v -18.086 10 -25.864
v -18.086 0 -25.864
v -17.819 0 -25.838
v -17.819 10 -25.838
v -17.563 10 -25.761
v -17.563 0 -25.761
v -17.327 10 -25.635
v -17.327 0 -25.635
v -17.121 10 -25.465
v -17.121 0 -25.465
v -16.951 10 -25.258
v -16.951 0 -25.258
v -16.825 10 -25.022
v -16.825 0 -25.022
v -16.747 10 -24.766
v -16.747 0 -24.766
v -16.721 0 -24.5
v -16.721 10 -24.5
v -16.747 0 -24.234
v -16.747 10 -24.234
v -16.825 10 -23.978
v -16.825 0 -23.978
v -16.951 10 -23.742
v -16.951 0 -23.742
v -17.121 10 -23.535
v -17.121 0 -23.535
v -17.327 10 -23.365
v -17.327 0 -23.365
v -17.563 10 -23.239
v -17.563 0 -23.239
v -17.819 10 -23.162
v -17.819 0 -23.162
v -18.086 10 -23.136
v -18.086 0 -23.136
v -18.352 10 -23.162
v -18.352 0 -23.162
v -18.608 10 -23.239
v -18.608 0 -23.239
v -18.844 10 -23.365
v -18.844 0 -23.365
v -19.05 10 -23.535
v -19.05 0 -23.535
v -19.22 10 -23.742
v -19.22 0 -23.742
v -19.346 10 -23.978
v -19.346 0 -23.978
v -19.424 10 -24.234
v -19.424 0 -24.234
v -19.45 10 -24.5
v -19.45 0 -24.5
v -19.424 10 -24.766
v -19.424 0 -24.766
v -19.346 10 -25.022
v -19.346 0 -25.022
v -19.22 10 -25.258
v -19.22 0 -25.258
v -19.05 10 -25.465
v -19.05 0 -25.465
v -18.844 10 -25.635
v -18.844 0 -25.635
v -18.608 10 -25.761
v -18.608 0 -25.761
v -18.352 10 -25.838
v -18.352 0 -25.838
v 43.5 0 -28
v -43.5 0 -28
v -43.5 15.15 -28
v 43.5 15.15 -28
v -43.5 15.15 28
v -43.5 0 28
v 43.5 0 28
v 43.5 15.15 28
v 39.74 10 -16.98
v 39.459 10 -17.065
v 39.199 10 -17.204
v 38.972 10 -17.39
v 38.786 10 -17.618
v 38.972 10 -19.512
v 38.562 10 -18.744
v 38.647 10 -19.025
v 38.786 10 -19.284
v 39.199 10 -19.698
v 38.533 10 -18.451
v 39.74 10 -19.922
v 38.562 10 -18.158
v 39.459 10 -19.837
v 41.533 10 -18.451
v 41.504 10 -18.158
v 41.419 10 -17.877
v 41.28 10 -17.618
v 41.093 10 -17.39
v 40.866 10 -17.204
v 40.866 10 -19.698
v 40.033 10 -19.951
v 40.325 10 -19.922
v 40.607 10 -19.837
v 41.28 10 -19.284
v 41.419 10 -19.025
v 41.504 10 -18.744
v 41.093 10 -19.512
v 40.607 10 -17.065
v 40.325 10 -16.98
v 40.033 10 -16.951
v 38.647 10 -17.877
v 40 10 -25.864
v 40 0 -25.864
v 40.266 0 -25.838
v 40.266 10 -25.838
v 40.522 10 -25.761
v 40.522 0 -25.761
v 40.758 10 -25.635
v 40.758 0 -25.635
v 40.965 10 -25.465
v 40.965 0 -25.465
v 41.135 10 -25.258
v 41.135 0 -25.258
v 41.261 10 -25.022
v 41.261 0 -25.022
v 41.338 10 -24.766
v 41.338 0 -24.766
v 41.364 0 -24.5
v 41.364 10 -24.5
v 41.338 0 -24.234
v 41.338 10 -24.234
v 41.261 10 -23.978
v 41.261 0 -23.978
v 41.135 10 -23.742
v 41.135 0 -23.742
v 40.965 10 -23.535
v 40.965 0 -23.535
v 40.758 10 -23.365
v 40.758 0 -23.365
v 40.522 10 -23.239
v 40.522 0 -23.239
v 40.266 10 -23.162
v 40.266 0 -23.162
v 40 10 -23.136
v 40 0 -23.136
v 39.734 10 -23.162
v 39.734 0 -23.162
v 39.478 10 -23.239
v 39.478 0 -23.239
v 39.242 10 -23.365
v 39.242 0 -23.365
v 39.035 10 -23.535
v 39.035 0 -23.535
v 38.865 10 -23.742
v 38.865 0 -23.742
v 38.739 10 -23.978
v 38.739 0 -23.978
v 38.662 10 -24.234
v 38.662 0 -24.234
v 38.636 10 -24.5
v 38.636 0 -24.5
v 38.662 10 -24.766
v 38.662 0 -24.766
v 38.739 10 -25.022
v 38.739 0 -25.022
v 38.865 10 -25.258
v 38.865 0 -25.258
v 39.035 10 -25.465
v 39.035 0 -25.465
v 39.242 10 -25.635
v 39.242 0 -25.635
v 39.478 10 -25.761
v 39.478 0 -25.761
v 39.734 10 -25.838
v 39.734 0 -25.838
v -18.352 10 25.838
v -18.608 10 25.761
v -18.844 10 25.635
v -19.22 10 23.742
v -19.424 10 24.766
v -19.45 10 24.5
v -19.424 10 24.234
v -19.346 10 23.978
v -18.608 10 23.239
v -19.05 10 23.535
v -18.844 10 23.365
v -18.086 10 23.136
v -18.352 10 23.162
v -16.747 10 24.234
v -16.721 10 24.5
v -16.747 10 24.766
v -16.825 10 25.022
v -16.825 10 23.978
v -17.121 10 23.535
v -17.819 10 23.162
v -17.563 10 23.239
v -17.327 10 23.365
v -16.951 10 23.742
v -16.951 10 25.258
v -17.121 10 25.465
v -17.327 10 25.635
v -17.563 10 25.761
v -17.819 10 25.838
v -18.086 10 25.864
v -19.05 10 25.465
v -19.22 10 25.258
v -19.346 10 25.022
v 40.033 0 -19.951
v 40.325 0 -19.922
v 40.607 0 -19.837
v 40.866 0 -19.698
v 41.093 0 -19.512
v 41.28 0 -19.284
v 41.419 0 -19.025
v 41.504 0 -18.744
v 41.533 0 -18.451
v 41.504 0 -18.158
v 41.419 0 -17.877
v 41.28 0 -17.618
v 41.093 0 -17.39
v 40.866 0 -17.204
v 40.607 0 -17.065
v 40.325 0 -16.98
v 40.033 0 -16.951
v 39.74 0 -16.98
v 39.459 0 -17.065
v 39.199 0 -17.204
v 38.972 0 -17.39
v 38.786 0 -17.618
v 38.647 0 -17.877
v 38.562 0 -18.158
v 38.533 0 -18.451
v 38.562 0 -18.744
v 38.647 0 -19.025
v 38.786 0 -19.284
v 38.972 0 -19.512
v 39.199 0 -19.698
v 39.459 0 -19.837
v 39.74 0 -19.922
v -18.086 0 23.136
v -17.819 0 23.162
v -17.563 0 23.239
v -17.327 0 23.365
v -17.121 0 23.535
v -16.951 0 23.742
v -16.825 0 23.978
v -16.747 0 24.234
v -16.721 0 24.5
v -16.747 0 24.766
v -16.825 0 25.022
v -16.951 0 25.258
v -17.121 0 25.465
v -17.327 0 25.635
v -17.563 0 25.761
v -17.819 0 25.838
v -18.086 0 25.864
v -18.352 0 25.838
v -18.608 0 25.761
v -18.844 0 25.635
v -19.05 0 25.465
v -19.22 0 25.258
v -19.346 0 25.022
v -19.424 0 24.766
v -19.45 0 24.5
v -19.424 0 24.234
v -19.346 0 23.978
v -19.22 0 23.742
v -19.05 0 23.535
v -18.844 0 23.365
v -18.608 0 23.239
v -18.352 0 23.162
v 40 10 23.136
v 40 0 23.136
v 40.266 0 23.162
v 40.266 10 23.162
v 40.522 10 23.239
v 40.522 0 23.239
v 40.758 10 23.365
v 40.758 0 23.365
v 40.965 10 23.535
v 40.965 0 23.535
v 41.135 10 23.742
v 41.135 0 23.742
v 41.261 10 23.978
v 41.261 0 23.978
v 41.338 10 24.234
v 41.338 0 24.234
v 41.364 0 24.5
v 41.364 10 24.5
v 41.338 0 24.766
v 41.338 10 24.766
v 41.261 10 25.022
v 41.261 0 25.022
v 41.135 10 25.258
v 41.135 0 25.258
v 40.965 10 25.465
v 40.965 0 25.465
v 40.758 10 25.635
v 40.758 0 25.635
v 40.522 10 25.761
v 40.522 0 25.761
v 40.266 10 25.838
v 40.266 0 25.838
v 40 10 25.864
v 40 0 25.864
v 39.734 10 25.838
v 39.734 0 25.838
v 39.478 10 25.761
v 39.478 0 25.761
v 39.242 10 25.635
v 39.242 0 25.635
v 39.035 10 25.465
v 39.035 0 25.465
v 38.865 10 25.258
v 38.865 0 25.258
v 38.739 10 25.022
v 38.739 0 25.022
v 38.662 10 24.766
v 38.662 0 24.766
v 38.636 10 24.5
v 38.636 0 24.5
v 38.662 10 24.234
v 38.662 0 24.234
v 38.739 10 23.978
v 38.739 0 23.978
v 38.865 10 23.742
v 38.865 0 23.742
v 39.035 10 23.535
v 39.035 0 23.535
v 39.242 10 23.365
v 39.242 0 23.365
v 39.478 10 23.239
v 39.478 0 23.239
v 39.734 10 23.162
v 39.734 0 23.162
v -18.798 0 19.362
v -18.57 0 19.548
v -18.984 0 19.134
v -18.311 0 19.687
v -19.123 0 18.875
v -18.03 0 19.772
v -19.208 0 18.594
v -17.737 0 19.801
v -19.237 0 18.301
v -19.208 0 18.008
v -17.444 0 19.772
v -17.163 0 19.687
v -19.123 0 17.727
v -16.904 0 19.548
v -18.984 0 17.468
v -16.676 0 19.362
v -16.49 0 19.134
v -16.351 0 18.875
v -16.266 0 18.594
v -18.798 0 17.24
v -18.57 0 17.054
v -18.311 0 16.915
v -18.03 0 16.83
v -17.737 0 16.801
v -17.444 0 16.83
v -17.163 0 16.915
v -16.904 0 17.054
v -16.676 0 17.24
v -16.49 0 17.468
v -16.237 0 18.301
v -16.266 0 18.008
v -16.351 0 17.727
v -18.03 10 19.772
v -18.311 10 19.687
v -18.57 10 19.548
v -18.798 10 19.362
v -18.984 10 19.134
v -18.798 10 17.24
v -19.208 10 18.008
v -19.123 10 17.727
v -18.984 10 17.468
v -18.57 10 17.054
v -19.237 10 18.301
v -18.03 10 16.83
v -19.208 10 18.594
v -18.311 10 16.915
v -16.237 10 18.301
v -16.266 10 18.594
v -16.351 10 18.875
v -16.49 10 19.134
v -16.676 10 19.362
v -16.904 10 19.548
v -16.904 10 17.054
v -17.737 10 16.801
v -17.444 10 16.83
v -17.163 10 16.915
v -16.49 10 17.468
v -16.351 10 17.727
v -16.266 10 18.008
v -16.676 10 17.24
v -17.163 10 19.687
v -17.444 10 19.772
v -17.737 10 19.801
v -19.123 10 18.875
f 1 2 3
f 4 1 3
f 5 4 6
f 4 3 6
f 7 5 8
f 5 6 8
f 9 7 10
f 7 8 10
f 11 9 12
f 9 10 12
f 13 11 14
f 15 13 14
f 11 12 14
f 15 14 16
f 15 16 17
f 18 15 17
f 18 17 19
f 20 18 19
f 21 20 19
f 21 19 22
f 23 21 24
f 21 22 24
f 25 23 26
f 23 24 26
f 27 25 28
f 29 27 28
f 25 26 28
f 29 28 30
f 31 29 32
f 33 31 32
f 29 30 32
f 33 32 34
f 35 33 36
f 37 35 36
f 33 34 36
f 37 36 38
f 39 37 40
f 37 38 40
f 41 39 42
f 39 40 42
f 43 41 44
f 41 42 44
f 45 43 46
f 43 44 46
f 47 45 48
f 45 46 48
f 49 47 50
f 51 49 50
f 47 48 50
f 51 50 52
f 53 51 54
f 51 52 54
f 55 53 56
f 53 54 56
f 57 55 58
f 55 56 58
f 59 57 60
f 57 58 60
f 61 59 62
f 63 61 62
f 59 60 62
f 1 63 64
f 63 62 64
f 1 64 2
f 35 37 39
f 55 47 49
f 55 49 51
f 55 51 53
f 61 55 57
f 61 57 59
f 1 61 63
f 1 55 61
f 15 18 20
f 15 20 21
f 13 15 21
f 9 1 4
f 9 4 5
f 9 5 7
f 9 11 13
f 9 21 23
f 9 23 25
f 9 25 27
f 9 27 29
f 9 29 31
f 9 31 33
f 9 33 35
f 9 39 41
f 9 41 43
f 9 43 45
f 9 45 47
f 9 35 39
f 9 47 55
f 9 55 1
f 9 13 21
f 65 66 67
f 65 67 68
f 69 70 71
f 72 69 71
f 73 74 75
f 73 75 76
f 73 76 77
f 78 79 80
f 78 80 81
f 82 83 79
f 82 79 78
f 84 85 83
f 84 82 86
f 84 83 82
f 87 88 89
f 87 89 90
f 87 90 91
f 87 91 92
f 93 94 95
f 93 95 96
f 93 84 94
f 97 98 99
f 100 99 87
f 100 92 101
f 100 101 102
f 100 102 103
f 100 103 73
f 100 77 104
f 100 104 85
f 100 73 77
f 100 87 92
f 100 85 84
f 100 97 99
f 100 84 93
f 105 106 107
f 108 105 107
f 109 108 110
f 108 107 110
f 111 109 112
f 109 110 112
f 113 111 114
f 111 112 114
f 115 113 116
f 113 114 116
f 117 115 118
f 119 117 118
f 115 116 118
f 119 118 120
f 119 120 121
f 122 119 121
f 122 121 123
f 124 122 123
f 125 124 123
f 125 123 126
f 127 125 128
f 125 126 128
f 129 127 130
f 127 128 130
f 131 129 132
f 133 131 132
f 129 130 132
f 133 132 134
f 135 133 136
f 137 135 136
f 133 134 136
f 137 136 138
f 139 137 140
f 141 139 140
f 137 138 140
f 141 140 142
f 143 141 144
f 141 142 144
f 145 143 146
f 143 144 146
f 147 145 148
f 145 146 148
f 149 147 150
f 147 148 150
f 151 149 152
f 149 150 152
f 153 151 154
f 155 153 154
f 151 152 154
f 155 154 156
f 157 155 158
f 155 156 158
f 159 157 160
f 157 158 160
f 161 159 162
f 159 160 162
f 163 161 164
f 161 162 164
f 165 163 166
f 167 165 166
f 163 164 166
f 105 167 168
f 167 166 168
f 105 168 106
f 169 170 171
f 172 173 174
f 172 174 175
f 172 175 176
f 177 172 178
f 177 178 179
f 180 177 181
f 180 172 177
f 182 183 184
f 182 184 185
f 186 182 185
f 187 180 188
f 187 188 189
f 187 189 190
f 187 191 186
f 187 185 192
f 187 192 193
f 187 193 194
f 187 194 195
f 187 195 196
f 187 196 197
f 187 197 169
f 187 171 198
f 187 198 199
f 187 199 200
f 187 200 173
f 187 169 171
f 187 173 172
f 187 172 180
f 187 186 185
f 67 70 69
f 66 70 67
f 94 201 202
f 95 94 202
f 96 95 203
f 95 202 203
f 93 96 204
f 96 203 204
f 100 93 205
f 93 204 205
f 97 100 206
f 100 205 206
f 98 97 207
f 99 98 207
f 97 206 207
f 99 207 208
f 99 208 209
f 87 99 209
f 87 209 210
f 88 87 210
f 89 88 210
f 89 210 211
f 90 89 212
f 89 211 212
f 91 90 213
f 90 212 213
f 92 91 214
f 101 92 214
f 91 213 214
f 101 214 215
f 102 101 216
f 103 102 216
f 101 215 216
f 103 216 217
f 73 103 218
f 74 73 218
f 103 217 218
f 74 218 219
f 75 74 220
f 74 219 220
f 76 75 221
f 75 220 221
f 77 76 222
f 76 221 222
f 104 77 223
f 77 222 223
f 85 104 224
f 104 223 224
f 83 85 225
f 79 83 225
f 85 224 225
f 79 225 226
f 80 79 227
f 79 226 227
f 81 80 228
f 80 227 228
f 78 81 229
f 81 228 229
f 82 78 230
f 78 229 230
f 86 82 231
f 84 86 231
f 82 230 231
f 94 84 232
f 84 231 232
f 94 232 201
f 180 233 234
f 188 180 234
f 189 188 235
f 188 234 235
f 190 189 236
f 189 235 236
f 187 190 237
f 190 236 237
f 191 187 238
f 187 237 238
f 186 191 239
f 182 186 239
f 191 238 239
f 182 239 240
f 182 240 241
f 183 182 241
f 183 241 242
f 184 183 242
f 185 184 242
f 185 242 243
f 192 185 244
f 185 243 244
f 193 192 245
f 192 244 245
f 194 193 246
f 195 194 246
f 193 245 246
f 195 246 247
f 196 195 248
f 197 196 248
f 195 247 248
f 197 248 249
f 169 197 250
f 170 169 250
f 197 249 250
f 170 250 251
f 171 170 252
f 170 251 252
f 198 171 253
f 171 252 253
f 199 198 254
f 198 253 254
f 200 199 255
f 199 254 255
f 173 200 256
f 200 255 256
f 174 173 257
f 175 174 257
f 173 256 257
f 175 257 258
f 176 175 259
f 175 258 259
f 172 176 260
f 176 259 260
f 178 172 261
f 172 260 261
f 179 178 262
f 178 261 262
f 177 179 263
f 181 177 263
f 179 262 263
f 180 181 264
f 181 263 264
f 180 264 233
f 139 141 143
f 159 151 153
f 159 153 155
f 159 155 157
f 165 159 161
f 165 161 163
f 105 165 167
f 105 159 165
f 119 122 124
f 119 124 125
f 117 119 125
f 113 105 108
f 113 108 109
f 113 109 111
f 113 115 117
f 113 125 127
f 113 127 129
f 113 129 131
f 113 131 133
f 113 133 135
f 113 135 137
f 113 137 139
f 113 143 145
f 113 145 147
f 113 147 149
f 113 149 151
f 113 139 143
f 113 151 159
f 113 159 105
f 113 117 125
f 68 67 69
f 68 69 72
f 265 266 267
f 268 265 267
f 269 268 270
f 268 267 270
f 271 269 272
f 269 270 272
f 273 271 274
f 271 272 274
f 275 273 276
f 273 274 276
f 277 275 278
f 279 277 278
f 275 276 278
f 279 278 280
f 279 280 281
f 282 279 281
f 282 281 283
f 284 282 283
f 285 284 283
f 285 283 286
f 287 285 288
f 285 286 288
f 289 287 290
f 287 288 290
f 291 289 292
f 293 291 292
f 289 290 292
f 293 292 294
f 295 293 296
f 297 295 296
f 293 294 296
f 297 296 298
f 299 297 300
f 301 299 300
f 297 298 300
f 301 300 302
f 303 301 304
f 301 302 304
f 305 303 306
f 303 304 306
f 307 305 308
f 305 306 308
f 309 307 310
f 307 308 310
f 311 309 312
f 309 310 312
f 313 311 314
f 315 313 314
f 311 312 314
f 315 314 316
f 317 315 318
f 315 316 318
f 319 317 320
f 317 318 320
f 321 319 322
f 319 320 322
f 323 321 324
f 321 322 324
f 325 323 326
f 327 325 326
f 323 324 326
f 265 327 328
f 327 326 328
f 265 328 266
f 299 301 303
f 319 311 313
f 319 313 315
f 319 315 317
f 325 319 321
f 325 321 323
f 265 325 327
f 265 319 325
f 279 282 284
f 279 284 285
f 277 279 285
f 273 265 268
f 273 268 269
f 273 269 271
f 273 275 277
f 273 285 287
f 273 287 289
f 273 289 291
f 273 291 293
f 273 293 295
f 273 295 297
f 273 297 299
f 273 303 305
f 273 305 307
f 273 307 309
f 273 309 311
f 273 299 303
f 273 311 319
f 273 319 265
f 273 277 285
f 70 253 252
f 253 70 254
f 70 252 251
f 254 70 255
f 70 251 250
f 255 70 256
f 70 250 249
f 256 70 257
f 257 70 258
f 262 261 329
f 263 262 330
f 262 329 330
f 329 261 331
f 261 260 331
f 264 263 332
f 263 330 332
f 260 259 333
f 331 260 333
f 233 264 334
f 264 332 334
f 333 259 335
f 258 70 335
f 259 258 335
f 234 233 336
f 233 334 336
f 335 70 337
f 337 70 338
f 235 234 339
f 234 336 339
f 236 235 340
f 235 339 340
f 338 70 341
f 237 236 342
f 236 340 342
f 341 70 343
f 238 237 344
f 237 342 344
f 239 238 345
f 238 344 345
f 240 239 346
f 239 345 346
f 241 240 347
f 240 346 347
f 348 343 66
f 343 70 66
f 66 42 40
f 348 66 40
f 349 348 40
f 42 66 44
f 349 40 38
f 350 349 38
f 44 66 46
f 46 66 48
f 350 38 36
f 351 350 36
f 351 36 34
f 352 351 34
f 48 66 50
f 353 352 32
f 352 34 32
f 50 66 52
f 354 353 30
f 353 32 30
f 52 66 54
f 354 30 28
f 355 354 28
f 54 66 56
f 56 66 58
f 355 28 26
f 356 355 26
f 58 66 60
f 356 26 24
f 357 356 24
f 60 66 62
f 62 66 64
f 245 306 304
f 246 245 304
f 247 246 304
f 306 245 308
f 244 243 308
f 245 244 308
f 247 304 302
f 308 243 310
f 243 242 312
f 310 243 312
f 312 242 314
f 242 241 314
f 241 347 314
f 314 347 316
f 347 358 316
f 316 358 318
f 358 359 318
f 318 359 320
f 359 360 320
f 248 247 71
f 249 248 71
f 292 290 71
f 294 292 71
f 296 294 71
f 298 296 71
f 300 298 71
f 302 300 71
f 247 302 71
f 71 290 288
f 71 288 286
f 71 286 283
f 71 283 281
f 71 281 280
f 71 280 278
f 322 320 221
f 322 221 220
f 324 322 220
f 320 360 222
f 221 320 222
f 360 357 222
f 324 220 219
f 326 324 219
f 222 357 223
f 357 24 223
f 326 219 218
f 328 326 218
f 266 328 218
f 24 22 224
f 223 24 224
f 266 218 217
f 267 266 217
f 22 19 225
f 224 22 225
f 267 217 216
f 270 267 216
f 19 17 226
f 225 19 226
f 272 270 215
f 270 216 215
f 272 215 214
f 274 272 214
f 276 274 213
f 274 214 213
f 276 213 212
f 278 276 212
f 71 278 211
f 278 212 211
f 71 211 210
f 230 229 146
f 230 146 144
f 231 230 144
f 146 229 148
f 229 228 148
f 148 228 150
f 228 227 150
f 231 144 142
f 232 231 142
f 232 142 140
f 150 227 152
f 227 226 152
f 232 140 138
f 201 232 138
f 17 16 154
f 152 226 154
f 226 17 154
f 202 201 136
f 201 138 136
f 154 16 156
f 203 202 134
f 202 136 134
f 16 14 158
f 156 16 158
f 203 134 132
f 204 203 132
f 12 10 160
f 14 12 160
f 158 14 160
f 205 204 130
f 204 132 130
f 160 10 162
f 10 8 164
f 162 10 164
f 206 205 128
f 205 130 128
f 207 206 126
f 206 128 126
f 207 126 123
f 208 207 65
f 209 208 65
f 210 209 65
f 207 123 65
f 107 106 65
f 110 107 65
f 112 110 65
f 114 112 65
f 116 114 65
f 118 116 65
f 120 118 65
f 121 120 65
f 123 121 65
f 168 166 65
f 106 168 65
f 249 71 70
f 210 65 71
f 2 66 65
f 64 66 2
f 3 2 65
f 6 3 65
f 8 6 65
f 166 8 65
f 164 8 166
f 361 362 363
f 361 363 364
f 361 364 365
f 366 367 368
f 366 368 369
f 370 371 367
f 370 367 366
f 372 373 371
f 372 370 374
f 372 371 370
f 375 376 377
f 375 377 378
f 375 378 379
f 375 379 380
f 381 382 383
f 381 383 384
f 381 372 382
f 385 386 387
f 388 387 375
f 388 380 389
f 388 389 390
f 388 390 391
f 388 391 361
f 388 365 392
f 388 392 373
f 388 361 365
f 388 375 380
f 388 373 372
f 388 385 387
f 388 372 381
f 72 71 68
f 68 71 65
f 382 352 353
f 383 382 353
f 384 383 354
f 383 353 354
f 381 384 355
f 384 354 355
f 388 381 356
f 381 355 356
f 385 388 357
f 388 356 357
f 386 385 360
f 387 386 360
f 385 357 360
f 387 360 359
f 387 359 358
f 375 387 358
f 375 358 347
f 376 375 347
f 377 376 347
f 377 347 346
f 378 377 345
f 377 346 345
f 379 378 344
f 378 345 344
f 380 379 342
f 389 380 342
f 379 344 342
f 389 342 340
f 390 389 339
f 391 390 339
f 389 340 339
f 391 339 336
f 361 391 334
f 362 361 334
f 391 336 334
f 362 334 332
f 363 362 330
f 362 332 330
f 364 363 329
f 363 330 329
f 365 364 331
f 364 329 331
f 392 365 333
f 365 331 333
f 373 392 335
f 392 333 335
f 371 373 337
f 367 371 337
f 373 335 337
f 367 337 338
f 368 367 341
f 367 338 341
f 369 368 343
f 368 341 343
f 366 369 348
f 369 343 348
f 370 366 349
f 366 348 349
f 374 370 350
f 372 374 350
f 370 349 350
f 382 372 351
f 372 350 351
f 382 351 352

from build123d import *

# Parameters (mm, degrees)
SKETCH_1_W          = 87
SKETCH_1_H          = 56
EXTRUDE_1_DEPTH     = 15.15
SKETCH_2_R          = 1.364499713
SKETCH_2_R_2        = 1.5
CUT_EXTRUDE_1_DEPTH = 10


with BuildPart() as part:
    # Эскиз1 → Бобышка-Вытянуть1 (new body)
    with BuildSketch(Plane(origin=(0, 0, 0), x_dir=(1, 0, 0), z_dir=(0, 1, 0))):
        Rectangle(SKETCH_1_W, SKETCH_1_H)
    extrude(amount=EXTRUDE_1_DEPTH)

    # Эскиз2 → Вырез-Вытянуть1 (cut)
    with BuildSketch(Plane.XZ):
        with Locations(Location((40, 24.5, 0), (0, 0, 270))):
            Circle(SKETCH_2_R)
        with Locations(Location((40.032744033, -18.451055431, 0), (0, 0, 270))):
            Circle(SKETCH_2_R_2)
        with Locations(Location((40, -24.5, 0), (0, 0, 270))):
            Circle(SKETCH_2_R)
        with Locations(Location((-18.085512482, -24.5, 0), (0, 0, 270))):
            Circle(SKETCH_2_R)
        with Locations(Location((-17.736958402, 18.300913925, 0), (0, 0, 270))):
            Circle(SKETCH_2_R_2)
        with Locations(Location((-18.085512482, 24.5, 0), (0, 0, 270))):
            Circle(SKETCH_2_R)
    extrude(amount=-CUT_EXTRUDE_1_DEPTH, mode=Mode.SUBTRACT)


solid = part.part
